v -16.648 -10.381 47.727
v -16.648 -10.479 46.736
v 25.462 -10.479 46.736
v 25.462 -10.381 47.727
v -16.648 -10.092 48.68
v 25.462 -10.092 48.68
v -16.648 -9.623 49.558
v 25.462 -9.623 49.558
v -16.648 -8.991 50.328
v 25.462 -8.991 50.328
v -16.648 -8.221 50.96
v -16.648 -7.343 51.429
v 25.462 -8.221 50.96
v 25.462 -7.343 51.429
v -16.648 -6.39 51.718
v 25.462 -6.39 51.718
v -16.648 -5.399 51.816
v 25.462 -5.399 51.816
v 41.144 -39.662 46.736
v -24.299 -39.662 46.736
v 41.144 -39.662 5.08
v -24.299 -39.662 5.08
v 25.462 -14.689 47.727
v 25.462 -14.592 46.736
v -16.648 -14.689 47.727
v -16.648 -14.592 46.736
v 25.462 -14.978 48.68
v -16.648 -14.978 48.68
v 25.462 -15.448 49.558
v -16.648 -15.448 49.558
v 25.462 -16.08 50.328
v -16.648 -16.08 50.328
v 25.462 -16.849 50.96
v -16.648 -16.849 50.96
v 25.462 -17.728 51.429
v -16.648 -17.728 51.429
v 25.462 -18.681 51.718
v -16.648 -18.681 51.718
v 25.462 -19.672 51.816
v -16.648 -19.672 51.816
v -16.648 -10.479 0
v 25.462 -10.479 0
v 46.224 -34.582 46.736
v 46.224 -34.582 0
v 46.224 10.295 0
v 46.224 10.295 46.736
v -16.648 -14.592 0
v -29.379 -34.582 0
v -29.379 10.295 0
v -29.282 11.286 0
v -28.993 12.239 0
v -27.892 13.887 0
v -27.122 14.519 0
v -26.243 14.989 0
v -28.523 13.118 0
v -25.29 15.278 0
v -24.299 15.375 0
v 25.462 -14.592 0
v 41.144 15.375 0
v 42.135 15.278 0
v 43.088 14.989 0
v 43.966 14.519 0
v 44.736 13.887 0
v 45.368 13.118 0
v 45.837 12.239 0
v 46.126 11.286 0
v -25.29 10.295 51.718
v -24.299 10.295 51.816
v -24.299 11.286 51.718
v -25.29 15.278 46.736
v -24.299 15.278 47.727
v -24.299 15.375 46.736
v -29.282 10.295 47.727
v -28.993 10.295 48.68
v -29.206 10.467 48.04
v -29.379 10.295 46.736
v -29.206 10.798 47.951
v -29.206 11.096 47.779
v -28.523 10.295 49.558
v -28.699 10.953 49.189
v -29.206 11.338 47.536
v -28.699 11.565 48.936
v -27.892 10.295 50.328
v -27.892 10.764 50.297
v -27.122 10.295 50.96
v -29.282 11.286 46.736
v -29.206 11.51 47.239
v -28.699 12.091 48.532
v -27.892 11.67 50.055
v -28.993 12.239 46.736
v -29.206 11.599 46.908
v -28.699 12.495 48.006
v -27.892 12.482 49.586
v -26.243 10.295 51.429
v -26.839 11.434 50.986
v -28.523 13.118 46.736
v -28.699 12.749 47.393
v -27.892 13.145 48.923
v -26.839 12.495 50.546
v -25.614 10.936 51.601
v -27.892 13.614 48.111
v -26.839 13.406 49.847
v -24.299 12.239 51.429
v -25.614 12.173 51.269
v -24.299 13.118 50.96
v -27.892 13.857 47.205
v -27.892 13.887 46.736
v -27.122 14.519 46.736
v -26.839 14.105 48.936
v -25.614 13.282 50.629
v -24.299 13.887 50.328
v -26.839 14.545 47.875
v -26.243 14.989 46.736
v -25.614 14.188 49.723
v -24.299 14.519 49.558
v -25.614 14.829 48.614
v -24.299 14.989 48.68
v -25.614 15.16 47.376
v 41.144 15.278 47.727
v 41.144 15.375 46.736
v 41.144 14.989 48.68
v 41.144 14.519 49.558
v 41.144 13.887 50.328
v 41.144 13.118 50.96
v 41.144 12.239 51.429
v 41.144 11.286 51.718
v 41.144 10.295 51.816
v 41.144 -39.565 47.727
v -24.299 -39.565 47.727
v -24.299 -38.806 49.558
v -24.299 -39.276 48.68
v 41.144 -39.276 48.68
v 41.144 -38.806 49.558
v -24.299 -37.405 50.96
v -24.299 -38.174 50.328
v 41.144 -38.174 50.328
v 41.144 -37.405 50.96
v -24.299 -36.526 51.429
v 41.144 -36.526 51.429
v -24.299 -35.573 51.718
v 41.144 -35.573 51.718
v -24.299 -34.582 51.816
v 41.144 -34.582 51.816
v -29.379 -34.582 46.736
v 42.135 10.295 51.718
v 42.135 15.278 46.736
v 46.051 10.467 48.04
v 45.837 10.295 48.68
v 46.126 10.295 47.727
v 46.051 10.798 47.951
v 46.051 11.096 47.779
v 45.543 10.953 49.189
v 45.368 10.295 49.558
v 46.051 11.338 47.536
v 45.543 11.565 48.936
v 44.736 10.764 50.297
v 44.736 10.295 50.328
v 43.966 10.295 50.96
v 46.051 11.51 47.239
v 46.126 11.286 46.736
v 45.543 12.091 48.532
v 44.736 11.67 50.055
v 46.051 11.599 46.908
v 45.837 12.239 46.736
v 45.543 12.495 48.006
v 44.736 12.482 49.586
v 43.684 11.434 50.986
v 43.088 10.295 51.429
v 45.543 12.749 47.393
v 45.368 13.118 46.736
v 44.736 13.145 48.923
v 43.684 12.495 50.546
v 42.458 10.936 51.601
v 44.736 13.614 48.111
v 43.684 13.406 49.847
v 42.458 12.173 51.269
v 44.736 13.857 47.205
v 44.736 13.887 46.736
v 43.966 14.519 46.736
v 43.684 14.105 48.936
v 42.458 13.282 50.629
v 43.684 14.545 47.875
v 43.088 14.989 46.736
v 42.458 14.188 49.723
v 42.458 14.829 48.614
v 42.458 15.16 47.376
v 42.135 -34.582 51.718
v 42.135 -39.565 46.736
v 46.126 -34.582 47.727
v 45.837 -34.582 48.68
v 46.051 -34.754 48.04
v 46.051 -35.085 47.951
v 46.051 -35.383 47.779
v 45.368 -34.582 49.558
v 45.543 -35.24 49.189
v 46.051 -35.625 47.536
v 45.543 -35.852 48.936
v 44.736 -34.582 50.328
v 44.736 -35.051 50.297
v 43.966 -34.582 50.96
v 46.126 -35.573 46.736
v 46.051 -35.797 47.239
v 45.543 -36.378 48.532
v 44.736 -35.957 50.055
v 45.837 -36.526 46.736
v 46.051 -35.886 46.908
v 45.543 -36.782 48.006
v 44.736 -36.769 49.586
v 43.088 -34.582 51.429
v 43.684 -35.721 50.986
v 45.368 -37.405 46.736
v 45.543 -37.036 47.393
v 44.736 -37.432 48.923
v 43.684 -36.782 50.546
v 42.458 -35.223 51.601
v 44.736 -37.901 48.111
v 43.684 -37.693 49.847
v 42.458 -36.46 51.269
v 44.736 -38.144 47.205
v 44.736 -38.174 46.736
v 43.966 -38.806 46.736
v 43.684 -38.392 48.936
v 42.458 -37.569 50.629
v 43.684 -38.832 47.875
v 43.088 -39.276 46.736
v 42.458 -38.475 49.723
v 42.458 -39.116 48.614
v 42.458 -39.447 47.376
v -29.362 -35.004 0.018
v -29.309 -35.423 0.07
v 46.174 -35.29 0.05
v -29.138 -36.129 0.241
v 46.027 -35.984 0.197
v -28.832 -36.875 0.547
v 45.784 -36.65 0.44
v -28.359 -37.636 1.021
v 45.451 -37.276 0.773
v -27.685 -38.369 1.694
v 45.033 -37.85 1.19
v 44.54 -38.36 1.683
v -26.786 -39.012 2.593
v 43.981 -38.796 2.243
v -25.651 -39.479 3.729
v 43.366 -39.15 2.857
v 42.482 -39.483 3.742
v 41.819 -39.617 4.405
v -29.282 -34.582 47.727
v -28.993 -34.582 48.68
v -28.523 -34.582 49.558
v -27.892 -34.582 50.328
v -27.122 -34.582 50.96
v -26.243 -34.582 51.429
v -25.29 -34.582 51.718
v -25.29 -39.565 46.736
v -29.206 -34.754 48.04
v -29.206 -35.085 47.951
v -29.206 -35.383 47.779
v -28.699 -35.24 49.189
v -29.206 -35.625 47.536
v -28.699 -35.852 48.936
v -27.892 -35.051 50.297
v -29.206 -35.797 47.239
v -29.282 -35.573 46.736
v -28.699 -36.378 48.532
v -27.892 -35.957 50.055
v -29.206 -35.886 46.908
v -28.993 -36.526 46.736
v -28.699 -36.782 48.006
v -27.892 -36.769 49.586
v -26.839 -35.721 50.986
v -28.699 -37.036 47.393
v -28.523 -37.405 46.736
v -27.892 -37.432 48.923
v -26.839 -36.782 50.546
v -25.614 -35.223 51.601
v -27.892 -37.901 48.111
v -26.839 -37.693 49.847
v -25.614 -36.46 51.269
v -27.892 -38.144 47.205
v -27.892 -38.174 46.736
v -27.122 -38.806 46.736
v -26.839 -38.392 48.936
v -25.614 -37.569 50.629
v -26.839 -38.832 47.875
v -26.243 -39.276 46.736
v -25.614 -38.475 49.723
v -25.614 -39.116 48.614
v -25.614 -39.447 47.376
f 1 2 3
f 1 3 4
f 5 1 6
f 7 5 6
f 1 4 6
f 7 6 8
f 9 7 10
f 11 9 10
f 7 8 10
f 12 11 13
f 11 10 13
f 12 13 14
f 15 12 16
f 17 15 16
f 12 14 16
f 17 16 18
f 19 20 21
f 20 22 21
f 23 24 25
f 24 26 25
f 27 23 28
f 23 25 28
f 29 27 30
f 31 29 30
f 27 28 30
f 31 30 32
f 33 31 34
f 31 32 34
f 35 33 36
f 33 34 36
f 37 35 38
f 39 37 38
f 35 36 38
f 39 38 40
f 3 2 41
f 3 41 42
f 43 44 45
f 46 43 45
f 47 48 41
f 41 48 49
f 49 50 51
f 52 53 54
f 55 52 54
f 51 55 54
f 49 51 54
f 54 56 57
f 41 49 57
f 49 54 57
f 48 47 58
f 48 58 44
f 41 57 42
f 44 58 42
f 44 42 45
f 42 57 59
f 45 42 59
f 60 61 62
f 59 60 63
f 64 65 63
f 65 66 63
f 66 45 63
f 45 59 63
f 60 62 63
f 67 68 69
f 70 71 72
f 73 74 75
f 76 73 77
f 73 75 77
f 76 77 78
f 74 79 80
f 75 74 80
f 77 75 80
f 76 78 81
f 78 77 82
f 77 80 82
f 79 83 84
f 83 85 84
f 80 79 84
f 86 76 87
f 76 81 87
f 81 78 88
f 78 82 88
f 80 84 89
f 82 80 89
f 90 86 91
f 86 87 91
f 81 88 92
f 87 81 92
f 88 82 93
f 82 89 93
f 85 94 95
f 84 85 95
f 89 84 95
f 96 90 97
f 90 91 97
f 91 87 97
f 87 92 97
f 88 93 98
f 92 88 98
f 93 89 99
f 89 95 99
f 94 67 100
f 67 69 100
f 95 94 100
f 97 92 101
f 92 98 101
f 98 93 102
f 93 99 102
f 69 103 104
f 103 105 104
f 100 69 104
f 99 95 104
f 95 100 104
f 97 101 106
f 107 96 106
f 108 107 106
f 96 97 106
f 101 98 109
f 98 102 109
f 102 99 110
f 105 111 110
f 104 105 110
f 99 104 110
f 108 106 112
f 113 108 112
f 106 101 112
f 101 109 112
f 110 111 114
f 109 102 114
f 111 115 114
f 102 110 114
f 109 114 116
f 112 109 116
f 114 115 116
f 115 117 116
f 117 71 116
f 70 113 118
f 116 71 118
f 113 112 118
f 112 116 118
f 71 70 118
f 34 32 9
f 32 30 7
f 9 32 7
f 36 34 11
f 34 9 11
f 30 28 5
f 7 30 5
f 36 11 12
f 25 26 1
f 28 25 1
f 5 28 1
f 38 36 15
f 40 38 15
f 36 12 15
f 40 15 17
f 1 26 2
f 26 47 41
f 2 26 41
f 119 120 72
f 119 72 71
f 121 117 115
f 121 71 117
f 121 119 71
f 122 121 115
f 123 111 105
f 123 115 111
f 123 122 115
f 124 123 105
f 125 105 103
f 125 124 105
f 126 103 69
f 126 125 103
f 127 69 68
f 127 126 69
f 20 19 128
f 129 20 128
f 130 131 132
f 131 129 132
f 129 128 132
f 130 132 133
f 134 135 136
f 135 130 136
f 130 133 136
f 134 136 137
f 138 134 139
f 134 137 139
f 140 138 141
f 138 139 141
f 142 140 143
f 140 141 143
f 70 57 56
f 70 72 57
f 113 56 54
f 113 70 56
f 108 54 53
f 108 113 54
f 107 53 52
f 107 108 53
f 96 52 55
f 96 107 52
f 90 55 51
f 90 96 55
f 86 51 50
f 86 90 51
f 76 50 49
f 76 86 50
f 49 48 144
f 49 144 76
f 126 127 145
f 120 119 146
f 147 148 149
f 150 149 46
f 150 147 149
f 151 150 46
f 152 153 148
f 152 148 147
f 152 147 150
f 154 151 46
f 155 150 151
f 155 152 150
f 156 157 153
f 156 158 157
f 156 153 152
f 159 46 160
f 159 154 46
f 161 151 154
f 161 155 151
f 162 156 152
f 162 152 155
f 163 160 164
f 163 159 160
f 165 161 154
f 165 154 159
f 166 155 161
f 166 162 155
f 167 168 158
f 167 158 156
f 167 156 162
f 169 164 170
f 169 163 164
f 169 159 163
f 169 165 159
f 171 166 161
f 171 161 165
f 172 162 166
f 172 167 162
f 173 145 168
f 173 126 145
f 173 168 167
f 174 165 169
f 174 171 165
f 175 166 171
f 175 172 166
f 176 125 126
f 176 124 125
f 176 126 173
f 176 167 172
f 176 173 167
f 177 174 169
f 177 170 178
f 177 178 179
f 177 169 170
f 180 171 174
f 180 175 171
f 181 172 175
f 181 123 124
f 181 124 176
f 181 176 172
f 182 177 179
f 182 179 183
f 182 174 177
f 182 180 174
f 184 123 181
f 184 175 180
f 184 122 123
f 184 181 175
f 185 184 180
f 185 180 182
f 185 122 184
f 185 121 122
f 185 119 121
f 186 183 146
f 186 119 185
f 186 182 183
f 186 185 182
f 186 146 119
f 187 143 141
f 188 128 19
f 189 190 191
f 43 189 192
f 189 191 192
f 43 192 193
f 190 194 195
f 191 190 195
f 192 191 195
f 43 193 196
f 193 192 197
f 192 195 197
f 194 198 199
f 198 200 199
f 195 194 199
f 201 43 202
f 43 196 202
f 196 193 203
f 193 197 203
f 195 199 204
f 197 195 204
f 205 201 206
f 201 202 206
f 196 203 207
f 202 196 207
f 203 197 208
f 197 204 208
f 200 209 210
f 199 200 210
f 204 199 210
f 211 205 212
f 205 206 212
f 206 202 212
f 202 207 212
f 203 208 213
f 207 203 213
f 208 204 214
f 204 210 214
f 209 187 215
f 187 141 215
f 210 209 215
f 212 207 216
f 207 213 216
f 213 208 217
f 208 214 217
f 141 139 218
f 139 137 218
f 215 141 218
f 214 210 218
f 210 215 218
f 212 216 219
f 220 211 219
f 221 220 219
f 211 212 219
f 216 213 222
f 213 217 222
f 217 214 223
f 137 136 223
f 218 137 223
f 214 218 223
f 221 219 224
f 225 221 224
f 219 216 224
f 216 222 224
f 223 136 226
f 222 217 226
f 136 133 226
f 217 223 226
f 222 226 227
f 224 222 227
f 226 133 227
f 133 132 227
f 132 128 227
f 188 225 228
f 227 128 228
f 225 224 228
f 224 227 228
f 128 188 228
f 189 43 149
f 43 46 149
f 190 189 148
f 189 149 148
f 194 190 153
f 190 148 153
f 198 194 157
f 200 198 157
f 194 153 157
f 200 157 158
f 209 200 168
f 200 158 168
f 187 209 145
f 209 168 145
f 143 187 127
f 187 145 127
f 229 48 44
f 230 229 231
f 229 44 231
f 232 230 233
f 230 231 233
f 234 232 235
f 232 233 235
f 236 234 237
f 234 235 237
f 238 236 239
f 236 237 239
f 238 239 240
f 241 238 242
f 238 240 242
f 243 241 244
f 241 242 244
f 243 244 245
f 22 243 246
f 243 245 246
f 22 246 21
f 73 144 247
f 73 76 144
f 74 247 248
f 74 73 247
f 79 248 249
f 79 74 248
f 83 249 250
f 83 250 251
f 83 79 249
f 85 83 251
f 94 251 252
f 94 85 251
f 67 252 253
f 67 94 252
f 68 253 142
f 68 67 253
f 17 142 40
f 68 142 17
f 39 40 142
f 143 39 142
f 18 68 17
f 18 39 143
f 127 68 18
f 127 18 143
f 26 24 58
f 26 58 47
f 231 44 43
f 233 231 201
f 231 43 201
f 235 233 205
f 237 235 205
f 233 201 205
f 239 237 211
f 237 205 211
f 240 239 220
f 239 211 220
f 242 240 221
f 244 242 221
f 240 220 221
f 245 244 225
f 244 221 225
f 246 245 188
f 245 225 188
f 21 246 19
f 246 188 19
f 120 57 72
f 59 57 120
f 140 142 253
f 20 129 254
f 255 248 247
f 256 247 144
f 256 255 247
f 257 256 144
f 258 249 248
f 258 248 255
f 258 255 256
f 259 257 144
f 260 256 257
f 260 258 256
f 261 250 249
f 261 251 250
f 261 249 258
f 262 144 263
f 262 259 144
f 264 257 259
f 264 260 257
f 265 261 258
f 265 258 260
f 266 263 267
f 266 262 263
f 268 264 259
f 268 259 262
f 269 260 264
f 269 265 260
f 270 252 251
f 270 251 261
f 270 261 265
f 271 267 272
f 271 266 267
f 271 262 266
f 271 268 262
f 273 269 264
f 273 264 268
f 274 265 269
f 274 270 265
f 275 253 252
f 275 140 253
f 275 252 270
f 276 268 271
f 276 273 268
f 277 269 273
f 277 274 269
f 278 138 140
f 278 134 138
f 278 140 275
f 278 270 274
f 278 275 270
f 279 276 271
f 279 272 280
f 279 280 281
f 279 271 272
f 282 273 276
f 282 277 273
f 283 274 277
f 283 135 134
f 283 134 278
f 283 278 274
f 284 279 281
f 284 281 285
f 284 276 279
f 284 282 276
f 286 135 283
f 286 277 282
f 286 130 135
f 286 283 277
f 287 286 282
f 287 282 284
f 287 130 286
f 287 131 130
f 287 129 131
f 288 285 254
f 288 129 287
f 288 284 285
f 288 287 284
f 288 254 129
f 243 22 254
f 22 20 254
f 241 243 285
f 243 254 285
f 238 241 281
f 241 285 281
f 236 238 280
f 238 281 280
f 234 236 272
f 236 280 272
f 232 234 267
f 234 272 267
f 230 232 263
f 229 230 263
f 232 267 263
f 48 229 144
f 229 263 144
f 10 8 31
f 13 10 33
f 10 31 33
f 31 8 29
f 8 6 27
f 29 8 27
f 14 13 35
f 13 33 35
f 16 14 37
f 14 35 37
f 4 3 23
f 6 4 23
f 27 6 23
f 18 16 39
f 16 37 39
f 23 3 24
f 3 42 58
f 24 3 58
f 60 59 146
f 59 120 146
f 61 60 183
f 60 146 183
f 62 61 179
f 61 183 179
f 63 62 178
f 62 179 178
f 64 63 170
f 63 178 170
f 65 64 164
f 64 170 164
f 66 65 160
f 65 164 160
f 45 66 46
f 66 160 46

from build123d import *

# Parameters (mm, degrees)
F0_W     = 75.603081
F0_H     = 55.037481
F1_DEPTH = 51.816
F2_R     = 5.08
F3_R     = 5.08


with BuildPart() as f1:
    # F0 (on Top) → F1 (new body)
    with BuildSketch(Plane.XY):
        with Locations((8.422104, -12.143501)):
            Rectangle(F0_W, F0_H)
        Polygon((-16.648348, -10.478666), (-7.246927, -10.478666), (25.462179, -10.478666), (25.462179, -14.591787), (-7.246927, -14.591787), (-12.339364, -14.591787), (-16.648348, -14.591787), (-16.648348, -11.262118), align=None, mode=Mode.SUBTRACT)
    extrude(amount=F1_DEPTH)

    # F2
    f2_edges = [f1.edges().sort_by_distance(p)[0] for p in [
        (4.406915, -14.591787, 51.816),
    ]]
    fillet(f2_edges, radius=F2_R)

    # F3
    f3_edges = [f1.edges().sort_by_distance(p)[0] for p in [
        (8.422104, 15.375239, 51.816),
        (8.422104, -39.662242, 51.816),
        (46.223644, -12.143502, 51.816),
        (-29.379437, -12.143502, 51.816),
        (4.406915, -10.478666, 51.816),
        (-29.379437, -39.662242, 25.908),
        (46.223644, -39.662242, 25.908),
        (8.422104, -39.662242, 0),
        (46.223644, 15.375239, 25.908),
        (-29.379437, 15.375239, 25.908),
    ]]
    fillet(f3_edges, radius=F3_R)


solid = f1.part
